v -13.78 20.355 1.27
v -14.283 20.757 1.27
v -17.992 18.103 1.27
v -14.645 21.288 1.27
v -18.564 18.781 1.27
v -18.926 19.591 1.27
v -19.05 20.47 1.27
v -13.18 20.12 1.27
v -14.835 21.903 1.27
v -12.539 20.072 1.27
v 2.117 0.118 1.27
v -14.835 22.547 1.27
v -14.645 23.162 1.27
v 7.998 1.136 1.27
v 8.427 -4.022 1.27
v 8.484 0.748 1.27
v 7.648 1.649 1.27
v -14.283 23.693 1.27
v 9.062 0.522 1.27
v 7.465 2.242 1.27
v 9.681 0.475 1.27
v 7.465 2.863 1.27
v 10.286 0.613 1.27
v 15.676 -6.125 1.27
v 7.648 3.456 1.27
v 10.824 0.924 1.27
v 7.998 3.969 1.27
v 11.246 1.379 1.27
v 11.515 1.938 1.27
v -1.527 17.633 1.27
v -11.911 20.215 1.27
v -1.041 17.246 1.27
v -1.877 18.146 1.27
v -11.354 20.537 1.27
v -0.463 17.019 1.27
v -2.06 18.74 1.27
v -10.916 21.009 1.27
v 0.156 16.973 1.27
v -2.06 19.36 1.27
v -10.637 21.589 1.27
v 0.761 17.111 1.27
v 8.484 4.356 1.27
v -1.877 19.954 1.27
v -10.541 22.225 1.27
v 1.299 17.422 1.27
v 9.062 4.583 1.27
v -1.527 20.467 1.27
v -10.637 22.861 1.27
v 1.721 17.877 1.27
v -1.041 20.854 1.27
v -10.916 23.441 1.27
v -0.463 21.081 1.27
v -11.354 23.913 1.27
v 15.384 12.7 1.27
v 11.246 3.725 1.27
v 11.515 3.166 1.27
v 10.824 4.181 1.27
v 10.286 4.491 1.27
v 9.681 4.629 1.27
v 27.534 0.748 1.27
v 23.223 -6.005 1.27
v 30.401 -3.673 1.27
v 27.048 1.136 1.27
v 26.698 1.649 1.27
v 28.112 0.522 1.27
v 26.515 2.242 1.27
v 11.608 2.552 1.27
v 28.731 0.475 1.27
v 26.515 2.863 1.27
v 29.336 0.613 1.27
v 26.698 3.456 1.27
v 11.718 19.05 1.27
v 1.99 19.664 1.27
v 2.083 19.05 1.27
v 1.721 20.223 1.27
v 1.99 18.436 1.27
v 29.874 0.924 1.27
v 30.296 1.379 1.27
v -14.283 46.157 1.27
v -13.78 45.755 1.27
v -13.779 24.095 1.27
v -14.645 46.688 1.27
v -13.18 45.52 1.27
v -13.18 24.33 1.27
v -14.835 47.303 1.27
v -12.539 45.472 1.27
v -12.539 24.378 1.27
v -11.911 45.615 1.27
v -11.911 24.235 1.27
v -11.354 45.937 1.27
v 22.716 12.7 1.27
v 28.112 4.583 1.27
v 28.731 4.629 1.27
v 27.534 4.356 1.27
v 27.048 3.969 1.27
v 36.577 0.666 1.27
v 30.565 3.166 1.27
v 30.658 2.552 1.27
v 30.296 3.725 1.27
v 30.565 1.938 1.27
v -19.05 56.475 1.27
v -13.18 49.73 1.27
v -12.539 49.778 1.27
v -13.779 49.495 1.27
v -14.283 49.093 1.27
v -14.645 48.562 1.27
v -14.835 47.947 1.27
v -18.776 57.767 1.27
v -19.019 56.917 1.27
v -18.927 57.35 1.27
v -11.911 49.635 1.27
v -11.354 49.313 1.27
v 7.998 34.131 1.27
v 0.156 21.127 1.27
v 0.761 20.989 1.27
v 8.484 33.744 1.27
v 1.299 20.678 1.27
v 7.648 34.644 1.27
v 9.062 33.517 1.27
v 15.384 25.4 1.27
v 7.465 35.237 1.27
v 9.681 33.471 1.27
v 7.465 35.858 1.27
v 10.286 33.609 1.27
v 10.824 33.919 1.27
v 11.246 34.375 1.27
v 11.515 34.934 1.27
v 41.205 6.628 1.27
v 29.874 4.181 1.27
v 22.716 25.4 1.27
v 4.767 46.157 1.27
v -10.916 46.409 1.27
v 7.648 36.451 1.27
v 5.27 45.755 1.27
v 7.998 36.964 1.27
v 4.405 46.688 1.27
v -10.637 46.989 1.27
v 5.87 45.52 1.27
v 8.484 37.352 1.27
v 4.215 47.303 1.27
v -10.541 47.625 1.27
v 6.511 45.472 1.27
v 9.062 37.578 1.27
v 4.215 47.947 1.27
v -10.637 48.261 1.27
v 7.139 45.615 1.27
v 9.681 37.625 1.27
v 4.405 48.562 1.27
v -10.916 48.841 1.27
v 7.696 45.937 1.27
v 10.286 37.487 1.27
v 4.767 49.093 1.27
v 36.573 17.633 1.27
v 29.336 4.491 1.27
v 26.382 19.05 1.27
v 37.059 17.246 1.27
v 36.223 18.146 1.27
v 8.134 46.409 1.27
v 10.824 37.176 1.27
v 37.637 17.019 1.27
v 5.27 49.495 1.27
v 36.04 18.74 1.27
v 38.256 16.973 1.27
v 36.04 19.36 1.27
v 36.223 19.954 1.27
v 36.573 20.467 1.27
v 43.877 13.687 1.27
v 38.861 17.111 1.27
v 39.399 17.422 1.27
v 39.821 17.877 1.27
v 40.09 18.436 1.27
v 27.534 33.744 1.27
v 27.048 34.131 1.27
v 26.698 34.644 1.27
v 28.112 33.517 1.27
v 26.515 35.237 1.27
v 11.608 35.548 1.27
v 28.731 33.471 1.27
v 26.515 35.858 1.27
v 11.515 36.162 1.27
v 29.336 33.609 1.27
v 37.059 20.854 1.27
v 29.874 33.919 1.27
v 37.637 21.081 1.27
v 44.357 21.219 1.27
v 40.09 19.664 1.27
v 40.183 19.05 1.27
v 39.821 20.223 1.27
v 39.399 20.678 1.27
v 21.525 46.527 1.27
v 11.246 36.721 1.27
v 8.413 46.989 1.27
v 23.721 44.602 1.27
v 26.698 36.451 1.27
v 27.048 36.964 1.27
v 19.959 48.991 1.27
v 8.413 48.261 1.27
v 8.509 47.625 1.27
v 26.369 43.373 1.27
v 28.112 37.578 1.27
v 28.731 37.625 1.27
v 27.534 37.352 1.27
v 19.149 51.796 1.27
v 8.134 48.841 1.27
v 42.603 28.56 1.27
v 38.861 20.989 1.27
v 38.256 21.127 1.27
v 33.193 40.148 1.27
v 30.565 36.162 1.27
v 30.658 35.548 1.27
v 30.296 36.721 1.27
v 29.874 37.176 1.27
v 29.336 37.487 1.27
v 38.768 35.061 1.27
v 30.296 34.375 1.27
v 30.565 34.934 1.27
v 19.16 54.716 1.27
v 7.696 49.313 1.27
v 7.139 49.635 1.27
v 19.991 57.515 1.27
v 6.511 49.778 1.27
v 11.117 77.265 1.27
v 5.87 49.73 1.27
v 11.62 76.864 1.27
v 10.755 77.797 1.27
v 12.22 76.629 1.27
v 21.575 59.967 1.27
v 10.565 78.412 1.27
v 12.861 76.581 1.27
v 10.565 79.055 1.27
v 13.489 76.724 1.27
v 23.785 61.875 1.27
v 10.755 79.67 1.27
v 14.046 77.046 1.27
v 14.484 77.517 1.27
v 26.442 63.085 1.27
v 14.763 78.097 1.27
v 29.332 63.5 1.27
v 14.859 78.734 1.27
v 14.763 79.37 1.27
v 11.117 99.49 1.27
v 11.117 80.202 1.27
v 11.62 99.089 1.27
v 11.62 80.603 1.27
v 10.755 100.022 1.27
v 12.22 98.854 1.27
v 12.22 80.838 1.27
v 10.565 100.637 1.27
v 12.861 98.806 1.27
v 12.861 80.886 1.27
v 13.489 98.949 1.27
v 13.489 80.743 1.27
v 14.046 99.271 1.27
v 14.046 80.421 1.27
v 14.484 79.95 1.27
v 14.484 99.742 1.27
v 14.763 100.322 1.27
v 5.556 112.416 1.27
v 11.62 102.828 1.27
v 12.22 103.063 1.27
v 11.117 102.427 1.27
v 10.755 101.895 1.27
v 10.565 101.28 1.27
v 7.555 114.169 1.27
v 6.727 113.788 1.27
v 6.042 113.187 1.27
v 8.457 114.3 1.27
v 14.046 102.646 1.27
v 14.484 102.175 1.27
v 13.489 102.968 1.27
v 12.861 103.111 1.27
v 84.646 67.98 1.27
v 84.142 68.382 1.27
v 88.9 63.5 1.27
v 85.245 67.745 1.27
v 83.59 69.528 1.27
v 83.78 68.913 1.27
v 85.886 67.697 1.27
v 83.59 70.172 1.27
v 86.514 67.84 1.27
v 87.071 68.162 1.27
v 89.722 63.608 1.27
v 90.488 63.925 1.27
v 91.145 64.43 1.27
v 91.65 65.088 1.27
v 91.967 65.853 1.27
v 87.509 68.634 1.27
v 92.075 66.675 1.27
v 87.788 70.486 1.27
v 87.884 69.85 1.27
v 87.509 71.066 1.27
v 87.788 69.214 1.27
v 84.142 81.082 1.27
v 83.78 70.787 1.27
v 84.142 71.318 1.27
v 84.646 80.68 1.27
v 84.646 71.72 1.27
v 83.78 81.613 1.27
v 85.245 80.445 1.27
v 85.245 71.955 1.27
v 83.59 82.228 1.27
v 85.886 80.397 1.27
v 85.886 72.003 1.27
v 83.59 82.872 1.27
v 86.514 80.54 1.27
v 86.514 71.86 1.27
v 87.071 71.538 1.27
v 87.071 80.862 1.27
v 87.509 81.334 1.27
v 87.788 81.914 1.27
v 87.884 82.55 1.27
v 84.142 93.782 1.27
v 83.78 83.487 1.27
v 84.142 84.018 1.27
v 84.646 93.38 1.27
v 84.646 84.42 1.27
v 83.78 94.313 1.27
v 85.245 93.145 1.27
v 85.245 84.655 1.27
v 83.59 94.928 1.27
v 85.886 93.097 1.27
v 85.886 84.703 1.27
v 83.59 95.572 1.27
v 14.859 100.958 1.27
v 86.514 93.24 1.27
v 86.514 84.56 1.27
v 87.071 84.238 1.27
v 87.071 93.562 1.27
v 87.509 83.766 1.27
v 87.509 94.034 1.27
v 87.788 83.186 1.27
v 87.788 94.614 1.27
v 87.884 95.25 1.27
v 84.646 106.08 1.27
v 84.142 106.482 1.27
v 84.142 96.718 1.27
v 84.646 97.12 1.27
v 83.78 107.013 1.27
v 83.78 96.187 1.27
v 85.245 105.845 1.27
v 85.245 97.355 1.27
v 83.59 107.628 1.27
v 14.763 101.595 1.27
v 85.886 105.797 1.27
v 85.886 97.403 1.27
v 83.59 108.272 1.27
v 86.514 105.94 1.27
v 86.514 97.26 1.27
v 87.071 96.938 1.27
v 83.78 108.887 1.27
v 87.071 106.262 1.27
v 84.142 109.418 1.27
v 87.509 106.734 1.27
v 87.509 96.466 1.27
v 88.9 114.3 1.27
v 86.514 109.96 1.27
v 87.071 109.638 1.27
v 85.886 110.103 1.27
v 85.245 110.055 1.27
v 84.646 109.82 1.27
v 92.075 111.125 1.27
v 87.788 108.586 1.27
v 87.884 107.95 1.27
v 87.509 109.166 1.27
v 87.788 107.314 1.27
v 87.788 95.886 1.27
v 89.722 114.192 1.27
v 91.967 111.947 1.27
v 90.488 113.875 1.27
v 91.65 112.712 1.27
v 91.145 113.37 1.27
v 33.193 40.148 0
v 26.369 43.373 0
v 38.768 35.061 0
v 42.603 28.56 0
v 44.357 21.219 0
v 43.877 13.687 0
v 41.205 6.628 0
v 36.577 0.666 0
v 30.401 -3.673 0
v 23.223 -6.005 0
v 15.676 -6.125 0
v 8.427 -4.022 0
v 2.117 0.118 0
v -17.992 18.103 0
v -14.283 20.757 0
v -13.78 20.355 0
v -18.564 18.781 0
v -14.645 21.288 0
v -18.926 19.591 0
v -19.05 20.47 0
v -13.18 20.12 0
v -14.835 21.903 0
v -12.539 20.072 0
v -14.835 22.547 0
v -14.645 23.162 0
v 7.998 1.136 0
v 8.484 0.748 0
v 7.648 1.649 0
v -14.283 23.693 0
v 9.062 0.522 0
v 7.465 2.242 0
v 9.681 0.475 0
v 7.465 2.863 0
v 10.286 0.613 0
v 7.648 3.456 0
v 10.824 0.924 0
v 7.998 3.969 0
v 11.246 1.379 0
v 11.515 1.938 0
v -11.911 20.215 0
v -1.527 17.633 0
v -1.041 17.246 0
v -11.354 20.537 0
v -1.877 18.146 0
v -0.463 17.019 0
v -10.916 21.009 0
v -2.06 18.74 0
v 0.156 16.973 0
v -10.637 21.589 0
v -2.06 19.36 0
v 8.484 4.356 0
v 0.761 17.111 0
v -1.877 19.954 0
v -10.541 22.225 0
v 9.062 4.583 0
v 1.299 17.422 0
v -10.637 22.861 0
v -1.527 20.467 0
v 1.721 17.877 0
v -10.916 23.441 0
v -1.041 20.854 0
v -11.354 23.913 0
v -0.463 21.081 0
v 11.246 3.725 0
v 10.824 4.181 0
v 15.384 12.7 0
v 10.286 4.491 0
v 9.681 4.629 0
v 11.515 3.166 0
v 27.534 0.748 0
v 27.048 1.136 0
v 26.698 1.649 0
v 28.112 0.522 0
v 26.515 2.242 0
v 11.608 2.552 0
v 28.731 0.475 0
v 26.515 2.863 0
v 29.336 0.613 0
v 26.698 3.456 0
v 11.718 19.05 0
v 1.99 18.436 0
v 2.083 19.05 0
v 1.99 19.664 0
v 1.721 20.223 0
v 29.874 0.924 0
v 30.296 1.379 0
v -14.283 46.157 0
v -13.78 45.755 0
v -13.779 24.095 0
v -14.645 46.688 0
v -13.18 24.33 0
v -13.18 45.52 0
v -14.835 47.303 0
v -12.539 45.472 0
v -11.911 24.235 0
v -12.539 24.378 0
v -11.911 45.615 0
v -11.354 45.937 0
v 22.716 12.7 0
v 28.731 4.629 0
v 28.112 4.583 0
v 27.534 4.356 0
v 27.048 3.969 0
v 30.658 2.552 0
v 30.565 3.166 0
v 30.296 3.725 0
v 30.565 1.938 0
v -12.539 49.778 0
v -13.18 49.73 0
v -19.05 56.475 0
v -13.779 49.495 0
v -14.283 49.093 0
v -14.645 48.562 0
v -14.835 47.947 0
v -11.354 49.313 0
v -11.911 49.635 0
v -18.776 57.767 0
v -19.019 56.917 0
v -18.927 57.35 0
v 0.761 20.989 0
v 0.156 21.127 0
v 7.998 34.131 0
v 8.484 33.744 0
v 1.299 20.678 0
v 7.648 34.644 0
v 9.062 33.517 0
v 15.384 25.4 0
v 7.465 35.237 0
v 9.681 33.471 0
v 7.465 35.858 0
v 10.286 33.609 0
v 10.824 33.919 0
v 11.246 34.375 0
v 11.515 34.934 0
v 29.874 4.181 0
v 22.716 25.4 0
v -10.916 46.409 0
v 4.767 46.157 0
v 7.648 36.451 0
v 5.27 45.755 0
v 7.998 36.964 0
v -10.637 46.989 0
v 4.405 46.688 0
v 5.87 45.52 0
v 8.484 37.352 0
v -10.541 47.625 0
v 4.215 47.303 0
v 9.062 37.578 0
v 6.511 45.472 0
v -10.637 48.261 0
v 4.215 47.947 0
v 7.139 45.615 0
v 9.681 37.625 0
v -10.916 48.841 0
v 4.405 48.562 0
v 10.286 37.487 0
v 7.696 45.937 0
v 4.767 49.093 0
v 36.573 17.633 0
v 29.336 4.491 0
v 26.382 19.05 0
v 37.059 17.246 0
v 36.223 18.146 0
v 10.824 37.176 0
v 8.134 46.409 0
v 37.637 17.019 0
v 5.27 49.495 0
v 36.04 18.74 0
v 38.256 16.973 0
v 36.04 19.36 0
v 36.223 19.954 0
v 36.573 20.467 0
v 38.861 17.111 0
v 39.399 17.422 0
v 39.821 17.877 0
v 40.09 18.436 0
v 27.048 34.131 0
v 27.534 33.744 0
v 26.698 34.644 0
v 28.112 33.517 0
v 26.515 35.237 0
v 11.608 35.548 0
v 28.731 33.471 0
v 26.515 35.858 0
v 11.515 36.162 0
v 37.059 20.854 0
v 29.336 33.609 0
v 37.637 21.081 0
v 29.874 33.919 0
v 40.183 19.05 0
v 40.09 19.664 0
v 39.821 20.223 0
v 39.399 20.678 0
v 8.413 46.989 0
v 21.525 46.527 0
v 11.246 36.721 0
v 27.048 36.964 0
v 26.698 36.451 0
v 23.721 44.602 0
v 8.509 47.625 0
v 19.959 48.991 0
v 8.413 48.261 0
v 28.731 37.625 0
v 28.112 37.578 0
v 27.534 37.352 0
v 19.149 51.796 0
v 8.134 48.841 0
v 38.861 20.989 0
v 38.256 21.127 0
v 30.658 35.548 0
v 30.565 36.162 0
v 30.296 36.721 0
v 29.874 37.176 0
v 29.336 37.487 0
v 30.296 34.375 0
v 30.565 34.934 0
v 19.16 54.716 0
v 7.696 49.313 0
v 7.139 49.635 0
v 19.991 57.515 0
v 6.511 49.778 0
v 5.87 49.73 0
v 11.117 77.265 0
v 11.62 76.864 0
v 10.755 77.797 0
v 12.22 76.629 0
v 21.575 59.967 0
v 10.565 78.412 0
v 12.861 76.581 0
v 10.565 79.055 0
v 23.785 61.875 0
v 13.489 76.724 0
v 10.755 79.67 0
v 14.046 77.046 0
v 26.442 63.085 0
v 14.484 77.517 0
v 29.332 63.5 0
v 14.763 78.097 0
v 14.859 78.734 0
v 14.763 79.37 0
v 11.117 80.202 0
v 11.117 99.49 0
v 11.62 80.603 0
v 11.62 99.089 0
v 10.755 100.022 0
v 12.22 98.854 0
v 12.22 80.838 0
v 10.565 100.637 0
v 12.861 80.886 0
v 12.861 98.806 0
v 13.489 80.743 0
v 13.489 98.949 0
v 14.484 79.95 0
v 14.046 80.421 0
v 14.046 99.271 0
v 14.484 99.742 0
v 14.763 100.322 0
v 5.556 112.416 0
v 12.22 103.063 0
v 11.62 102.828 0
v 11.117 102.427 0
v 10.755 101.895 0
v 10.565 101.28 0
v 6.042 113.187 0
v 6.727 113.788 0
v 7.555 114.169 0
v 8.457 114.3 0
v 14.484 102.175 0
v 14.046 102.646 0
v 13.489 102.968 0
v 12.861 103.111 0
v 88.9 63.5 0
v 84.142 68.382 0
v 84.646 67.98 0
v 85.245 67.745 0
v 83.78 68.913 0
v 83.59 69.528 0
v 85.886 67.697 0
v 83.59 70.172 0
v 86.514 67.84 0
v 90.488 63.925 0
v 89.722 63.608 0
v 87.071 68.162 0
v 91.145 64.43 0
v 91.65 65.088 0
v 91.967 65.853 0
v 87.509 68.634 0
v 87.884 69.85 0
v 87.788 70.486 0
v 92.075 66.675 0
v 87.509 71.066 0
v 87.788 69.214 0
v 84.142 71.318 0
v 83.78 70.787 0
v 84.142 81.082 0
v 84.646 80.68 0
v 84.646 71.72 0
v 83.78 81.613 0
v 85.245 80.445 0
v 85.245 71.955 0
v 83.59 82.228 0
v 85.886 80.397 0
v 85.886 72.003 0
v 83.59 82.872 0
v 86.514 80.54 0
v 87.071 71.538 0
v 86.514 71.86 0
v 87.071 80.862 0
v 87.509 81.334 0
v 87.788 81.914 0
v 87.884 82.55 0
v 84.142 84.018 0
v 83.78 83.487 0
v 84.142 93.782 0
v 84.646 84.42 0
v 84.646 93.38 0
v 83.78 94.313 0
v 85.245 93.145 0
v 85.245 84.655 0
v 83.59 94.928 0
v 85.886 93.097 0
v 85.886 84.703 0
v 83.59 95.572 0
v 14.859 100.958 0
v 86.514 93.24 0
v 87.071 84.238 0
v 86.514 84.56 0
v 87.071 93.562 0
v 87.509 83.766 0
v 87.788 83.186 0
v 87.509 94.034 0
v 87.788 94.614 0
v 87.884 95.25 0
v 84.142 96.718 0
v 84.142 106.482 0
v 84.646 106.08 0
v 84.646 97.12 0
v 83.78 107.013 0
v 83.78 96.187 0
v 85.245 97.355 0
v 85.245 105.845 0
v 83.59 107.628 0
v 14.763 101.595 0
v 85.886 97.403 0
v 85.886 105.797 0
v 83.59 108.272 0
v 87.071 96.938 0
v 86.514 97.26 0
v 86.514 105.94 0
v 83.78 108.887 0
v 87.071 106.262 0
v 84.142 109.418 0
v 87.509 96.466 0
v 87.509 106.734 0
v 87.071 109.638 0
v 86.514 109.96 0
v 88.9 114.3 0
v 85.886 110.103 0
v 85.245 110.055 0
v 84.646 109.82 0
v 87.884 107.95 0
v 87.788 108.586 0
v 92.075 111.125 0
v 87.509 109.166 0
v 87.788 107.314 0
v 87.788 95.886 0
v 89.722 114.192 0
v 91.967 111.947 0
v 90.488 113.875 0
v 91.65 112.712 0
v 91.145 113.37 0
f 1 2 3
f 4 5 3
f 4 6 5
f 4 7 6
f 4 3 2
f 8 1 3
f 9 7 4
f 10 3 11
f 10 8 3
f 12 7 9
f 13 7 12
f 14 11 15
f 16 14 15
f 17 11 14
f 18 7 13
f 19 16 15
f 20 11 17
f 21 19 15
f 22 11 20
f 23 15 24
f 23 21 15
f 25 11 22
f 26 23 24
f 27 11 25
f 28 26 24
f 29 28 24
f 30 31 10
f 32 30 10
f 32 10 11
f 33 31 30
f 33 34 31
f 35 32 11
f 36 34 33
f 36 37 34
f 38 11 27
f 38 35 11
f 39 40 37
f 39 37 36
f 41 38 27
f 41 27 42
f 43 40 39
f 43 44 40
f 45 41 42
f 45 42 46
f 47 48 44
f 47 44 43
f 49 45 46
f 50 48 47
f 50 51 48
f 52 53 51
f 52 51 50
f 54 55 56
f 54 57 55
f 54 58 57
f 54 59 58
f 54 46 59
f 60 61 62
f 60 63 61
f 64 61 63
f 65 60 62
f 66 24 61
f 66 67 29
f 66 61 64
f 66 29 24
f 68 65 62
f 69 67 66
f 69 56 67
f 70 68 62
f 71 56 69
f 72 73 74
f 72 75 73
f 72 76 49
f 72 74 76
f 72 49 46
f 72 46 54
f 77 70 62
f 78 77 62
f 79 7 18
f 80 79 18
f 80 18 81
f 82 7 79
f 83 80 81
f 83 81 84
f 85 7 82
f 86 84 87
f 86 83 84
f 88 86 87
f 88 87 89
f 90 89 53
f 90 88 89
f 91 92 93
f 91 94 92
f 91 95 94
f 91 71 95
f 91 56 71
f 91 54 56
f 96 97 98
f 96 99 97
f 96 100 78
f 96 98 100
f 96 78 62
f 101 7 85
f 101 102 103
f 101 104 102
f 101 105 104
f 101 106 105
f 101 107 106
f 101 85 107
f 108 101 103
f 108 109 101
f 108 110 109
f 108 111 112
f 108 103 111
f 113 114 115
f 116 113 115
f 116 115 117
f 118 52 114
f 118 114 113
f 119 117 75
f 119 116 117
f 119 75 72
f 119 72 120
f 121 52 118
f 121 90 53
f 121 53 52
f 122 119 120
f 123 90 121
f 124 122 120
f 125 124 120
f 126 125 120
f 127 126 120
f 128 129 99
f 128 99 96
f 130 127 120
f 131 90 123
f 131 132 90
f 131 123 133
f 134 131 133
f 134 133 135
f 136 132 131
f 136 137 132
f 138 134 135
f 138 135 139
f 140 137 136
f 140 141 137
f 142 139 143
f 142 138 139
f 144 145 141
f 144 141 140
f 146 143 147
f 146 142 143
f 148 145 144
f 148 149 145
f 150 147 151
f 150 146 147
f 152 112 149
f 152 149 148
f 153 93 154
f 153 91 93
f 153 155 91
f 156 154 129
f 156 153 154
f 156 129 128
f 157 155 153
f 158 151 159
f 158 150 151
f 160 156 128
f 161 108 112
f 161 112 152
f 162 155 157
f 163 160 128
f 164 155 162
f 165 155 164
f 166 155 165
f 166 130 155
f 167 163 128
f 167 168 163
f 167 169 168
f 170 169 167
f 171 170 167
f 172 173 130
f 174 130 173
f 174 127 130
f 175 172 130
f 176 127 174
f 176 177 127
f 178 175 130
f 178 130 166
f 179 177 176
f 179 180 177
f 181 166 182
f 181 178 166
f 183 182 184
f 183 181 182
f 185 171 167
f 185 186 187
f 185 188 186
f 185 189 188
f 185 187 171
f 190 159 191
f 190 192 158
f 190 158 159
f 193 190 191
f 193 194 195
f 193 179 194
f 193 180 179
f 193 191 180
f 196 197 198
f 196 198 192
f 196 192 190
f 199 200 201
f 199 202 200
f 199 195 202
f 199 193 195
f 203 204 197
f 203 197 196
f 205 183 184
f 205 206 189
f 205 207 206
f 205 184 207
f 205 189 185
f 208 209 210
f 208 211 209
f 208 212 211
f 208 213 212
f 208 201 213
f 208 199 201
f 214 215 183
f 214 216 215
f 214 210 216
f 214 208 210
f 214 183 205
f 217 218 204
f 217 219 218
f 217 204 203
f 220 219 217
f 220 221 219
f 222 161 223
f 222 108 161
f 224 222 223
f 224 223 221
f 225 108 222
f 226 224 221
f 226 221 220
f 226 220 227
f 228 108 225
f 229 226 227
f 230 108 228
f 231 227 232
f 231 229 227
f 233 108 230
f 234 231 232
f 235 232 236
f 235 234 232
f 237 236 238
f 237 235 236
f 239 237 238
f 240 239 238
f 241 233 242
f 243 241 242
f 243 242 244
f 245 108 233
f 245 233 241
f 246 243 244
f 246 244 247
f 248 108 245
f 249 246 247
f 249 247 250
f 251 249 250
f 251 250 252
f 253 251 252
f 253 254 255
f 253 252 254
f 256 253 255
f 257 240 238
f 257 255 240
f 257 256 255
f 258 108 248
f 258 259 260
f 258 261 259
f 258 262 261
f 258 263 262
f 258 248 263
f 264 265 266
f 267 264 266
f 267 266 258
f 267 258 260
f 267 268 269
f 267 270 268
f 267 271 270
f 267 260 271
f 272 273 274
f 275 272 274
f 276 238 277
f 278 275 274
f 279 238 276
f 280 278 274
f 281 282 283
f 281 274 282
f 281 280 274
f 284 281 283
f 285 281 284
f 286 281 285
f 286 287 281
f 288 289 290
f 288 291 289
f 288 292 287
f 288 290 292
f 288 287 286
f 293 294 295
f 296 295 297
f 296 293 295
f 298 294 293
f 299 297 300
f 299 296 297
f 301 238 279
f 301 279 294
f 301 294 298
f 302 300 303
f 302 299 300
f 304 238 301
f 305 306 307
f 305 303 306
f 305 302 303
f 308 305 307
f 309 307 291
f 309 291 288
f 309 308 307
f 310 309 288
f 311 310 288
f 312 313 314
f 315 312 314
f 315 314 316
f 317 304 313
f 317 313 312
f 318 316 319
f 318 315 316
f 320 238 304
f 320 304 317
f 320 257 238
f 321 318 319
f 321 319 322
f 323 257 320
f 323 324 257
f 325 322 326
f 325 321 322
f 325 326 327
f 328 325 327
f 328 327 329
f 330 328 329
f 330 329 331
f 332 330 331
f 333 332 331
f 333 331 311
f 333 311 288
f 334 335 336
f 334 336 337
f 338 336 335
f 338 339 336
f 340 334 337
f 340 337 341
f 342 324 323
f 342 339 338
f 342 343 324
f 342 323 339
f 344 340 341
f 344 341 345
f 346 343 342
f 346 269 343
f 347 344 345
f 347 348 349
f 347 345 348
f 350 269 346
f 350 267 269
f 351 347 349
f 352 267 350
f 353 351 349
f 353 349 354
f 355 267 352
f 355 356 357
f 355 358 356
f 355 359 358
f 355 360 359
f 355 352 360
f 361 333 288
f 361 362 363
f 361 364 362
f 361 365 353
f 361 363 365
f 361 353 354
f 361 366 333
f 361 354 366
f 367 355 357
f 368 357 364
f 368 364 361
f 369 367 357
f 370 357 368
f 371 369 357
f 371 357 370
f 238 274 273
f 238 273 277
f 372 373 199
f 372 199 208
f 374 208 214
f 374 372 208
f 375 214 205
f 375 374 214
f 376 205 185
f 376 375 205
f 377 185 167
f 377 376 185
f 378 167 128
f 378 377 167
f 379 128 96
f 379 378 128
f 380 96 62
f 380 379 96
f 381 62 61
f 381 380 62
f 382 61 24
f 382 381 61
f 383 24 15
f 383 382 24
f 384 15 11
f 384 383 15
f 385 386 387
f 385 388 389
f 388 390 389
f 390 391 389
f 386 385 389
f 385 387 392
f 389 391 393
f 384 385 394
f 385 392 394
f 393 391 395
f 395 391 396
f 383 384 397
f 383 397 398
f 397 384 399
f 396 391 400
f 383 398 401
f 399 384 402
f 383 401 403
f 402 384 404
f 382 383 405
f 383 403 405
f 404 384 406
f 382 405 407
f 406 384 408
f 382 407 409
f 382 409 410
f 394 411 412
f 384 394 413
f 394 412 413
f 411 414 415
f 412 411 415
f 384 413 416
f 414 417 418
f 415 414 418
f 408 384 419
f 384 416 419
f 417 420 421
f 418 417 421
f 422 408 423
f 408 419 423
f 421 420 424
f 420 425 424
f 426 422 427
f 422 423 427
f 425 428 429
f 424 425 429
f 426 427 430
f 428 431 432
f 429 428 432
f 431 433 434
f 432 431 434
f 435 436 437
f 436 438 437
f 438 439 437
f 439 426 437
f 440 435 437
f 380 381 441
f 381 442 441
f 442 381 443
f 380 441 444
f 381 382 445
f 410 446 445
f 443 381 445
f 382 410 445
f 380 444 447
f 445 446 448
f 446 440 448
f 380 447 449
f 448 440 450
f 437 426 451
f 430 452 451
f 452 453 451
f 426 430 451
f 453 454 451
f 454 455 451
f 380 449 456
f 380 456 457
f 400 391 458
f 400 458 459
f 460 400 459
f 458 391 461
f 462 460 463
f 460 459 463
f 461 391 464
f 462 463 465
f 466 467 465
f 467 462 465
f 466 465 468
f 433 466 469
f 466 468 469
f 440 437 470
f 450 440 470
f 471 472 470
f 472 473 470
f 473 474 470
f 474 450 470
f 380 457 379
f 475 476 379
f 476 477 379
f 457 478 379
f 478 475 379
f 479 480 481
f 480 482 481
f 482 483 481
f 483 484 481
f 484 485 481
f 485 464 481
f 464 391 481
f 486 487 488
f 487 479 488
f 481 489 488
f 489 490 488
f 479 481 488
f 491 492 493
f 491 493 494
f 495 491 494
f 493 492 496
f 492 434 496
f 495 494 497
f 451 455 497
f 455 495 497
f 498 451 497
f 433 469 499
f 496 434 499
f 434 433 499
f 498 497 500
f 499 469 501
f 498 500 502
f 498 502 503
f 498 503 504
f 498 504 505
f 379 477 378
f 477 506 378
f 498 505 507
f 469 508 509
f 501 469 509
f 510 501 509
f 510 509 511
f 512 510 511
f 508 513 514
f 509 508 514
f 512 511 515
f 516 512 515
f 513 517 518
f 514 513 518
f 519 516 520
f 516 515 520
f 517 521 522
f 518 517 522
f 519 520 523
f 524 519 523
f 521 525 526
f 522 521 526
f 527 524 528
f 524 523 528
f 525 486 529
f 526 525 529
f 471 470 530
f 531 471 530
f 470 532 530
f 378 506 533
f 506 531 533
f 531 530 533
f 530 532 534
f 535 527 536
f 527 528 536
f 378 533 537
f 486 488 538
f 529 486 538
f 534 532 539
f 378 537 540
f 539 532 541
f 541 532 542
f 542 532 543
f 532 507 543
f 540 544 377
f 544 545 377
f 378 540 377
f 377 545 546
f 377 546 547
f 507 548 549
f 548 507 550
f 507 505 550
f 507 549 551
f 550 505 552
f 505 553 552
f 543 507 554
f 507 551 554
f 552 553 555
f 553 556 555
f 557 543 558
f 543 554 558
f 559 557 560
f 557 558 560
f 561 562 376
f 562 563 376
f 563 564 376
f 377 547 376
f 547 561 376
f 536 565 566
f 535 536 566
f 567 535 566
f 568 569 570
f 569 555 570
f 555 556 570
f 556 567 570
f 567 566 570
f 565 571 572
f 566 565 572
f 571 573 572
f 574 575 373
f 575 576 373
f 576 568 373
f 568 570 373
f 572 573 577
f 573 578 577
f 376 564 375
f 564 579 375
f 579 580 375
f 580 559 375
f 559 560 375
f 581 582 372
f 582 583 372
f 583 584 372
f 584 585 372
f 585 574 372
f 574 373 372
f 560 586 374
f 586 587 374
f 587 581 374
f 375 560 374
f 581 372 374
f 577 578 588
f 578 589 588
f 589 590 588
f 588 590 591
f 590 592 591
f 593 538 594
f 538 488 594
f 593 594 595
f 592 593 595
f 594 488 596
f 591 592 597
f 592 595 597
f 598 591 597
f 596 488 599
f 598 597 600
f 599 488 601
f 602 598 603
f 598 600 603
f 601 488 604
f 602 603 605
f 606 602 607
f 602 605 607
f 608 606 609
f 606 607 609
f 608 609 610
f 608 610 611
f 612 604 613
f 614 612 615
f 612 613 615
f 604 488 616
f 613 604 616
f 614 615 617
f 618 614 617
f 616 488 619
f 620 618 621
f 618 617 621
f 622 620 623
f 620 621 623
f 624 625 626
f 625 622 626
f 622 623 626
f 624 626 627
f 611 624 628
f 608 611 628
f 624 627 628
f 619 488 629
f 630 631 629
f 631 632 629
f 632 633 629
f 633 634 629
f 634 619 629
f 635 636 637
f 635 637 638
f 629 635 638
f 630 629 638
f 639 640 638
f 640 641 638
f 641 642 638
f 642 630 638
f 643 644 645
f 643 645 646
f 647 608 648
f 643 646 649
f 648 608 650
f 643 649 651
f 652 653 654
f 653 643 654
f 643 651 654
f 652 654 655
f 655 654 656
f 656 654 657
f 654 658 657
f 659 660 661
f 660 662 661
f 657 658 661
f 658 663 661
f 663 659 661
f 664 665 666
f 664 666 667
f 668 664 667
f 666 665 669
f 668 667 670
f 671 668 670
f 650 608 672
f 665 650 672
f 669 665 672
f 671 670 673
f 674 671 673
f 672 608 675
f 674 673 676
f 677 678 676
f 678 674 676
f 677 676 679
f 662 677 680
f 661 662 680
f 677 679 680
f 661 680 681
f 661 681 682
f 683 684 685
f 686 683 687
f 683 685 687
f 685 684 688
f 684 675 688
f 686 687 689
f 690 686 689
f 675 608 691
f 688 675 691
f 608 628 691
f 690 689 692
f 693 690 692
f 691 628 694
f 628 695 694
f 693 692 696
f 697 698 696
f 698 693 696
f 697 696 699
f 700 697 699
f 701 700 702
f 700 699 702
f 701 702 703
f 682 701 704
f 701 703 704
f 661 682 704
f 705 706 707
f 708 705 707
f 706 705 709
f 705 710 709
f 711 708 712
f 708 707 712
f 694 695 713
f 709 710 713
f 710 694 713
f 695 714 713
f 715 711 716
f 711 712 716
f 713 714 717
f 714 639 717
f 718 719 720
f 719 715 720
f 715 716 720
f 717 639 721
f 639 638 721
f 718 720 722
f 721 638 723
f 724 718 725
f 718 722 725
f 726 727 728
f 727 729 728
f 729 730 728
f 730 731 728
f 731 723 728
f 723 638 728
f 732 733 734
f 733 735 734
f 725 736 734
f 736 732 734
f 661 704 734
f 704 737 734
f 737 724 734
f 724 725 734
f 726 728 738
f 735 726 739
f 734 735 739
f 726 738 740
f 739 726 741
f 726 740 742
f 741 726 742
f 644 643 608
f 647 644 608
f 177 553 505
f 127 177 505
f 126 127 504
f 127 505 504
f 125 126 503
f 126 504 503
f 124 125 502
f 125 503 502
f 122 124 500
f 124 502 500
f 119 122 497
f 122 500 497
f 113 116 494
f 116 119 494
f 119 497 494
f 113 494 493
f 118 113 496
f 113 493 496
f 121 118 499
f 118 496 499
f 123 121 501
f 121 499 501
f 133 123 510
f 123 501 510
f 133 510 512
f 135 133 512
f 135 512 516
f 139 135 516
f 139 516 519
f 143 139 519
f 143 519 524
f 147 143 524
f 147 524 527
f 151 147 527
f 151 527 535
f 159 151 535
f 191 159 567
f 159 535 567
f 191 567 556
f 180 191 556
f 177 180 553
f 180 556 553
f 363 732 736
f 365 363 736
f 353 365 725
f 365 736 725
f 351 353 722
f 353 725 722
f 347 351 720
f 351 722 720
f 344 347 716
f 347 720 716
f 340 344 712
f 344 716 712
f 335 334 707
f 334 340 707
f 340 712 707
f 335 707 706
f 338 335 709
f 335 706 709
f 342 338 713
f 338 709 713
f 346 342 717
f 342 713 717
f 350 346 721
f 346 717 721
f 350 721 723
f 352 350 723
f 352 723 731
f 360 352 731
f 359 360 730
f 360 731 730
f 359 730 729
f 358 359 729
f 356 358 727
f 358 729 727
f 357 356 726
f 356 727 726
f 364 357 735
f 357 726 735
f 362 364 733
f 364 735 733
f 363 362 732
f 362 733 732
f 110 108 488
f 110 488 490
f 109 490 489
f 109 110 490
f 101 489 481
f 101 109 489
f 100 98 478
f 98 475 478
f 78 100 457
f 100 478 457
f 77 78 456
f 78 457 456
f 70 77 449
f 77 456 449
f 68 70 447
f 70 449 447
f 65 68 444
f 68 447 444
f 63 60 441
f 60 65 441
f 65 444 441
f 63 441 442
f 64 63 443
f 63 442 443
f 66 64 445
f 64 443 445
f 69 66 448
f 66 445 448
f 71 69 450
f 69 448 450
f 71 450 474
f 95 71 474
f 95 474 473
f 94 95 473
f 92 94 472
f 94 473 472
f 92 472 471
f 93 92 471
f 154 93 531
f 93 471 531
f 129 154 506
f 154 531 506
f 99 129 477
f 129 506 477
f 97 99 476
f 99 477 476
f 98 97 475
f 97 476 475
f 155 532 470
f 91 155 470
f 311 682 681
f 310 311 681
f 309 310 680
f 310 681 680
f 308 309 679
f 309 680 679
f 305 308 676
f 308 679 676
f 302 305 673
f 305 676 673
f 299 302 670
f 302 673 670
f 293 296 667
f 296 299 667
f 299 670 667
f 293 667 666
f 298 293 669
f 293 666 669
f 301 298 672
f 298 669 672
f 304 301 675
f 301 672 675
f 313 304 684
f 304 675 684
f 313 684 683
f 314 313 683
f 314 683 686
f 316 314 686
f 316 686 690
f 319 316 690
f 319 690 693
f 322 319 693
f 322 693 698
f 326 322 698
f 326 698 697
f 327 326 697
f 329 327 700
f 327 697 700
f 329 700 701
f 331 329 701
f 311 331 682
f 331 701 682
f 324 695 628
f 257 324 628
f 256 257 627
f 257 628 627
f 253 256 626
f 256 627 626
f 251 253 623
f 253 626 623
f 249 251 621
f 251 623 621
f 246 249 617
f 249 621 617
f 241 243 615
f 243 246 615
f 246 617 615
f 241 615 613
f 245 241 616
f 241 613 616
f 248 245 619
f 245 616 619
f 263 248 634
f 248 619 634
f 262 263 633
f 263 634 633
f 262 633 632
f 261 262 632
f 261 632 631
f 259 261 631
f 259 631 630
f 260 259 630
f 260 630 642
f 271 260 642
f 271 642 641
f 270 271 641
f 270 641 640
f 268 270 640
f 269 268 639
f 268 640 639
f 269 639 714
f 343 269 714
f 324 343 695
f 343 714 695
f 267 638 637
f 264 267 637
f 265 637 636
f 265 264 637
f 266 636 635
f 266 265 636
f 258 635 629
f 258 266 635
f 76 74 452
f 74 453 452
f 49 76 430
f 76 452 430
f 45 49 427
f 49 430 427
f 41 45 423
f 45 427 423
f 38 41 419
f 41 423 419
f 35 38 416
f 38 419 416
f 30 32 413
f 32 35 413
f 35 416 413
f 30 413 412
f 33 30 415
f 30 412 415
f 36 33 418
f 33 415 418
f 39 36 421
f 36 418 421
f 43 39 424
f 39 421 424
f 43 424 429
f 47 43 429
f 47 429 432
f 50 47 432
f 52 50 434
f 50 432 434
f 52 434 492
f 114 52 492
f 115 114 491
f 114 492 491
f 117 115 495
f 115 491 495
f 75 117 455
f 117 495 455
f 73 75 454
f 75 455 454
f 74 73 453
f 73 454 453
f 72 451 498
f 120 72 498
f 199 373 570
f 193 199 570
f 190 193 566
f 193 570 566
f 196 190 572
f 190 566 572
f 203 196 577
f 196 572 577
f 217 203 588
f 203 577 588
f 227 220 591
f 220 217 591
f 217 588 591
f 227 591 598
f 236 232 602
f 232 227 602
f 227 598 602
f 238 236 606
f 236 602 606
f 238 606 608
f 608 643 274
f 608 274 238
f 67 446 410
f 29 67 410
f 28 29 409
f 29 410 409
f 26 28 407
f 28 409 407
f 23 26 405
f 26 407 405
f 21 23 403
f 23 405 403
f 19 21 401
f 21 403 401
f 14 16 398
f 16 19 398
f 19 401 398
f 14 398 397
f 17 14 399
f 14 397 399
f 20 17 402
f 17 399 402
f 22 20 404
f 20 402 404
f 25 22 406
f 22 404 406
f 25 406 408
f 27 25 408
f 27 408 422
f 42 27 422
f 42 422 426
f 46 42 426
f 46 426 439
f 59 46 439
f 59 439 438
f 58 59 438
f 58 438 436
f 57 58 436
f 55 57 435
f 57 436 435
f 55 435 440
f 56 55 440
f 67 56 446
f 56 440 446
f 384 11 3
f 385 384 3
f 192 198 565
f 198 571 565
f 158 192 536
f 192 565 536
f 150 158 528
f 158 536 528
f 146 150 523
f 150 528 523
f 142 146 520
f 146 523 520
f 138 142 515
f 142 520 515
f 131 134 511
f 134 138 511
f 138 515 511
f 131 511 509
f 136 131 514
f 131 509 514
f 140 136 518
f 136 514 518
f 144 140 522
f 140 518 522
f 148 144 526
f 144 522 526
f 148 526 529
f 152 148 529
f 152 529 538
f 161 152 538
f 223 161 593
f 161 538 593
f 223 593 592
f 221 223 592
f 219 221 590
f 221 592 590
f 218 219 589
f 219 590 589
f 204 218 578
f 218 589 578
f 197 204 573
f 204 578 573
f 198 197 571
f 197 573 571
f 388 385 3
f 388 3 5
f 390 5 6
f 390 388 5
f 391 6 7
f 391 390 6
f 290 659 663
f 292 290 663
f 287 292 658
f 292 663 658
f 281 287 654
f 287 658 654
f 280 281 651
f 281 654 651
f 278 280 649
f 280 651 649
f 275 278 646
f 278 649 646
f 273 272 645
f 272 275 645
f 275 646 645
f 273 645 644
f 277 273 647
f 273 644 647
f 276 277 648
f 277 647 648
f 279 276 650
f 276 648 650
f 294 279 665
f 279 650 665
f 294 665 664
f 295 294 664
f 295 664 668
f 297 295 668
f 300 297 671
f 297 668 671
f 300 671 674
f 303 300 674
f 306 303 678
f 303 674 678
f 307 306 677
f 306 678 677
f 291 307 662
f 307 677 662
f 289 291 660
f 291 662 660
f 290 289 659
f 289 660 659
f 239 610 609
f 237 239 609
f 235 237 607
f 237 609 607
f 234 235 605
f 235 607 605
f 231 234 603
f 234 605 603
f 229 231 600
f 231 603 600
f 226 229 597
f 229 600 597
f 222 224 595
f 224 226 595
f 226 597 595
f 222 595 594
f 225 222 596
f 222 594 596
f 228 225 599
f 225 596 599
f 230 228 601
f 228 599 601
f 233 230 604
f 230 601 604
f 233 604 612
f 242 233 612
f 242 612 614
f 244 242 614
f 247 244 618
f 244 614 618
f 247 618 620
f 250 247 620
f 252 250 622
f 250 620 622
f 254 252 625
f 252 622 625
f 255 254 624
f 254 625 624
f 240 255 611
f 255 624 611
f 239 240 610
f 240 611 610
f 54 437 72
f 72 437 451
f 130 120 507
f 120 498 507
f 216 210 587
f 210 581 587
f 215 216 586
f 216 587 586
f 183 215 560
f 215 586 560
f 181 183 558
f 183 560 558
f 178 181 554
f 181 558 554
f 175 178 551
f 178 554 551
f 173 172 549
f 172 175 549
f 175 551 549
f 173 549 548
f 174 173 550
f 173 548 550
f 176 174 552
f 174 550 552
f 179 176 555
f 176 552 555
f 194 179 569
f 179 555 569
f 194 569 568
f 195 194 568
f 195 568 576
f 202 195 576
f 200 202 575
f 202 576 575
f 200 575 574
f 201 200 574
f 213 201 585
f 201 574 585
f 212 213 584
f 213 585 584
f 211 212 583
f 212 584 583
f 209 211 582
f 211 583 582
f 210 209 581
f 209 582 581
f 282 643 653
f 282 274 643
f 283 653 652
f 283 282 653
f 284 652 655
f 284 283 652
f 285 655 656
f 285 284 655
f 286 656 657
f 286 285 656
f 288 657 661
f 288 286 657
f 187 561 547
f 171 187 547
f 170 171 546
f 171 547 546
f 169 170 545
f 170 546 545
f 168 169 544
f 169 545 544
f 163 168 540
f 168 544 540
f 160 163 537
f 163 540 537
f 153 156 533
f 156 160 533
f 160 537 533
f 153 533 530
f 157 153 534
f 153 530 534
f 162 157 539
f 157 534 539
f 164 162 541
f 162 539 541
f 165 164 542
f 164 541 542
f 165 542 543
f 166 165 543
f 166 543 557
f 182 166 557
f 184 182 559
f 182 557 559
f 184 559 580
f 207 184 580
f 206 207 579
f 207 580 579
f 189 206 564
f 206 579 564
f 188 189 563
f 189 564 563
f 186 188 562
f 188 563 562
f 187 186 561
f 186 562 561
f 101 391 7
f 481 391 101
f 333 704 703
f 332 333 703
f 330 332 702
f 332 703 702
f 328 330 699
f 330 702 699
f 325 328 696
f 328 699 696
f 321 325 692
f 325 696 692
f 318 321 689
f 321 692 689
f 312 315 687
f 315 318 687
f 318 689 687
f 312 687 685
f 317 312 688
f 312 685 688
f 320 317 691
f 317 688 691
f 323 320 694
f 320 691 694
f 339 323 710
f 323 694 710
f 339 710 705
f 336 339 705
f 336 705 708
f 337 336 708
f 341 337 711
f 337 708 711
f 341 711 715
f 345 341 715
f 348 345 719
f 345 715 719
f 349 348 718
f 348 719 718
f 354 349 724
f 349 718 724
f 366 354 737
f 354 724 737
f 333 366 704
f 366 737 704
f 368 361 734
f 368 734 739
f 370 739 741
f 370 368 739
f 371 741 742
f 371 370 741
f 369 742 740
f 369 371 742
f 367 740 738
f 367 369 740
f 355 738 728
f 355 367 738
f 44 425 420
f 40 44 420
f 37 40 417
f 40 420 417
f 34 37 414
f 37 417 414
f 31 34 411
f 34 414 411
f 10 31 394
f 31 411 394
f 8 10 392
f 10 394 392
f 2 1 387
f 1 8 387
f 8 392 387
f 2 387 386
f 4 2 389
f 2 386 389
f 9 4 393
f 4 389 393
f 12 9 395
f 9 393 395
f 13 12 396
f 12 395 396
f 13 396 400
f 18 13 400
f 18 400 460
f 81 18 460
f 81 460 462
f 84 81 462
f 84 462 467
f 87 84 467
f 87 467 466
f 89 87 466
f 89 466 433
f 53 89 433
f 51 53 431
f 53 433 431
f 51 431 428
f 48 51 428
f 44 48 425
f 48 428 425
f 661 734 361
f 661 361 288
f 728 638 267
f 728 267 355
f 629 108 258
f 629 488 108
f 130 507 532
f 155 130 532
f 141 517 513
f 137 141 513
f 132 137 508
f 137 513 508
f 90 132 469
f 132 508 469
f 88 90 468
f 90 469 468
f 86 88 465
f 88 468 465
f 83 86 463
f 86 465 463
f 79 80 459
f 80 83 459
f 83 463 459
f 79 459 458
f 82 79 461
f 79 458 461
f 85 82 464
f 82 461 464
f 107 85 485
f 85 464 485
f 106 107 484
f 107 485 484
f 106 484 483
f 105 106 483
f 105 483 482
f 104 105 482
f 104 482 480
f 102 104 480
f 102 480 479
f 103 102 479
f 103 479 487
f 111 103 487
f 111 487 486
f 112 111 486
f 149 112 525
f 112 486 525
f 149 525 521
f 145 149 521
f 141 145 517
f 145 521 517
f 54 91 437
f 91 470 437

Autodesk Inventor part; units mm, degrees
ref_plane "YZ Plane" through (0, 0, 0) normal (1, 0, 0) x (0, 1, 0)
ref_plane "XZ Plane" through (0, 0, 0) normal (0, 1, 0) x (-1, 0, 0)
ref_plane "XY Plane" through (0, 0, 0) normal (0, 0, 1) x (1, 0, 0)
sketch "Sketch1" plane through (0, 0, 0) normal (0, 0, 1) x (1, 0, 0)
  circle A0 centre (19.05, 19.05) radius 7.9375
  line L0 (22.7162, 25.4) -> (26.3823, 19.05)
  line L1 (26.3823, 19.05) -> (22.7162, 12.7)
  line L2 (22.7162, 12.7) -> (15.3838, 12.7)
  line L3 (15.3838, 12.7) -> (11.7177, 19.05)
  line L4 (11.7177, 19.05) -> (15.3838, 25.4)
  line L5 (15.3838, 25.4) -> (22.7162, 25.4)
  circle A1 centre (0, 19.05) radius 2.0828
  line L6 (0, 19.05) -> (19.05, 19.05) construction
  circle A2 centre (9.525, 2.5522) radius 2.0828
  circle A3 centre (28.575, 2.5522) radius 2.0828
  circle A4 centre (38.1, 19.05) radius 2.0828
  circle A5 centre (28.575, 35.5478) radius 2.0828
  circle A6 centre (9.525, 35.5478) radius 2.0828
  circle A7 centre (19.05, 19.05) radius 25.4
  line L7 (19.05, -6.35) -> (-19.05, -6.35)
  line L8 (-19.05, -6.35) -> (-19.05, 57.15)
  line L9 (6.3948, 114.3) -> (92.075, 114.3)
  line L10 (92.075, 114.3) -> (92.075, 63.5)
  line L11 (92.075, 63.5) -> (29.3317, 63.5)
  line L12 (-121.3454, 55.7276) -> (199.3502, 55.7276) construction
  arc A8 (29.3317, 63.5) -> (26.369, 43.3727) centre (29.3317, 53.2183) ccw
  circle A9 centre (85.725, 69.85) radius 2.159
  circle A10 centre (85.725, 82.55) radius 2.159
  circle A11 centre (85.725, 95.25) radius 2.159
  circle A12 centre (85.725, 107.95) radius 2.159
  line L13 (29.3317, 53.2183) -> (19.05, 53.2183) construction
  line L14 (-19.05, 57.15) -> (6.3948, 114.3)
  circle A13 centre (-12.7, 47.625) radius 2.159
  circle A14 centre (6.35, 47.625) radius 2.159
  circle A15 centre (-12.7, 22.225) radius 2.159
  circle A16 centre (12.7, 78.7335) radius 2.159
  circle A17 centre (12.7, 100.9585) radius 2.159
  point P0 (0, 0)
  point P1 (19.05, 44.45)
  dimension "d7" = 15.875
  dimension "d8" = 12.7
  dimension "d23" = 4.1656
  dimension "d25" = 19.05
  dimension "d26" = 0
  dimension "d29" = 360
  dimension "d41" = 50.8
  dimension "d42" = 19.05
  dimension "d43" = 19.05
  dimension "d44" = 38.1
  dimension "d55" = 73.025
  dimension "d57" = 4.318
  dimension "d58" = 6.35
  dimension "d59" = 6.35
  dimension "d62" = 12.7
  dimension "d67" = 6.35
  dimension "d68" = 36.6776
  dimension "d69" = 50.8
  dimension "d70" = 38.1
  dimension "d71" = 114
  dimension "d72" = 57.15
  dimension "d76" = 56.3933
  dimension "d78" = 6.35
  dimension "d79" = 9.525
  dimension "d84" = 19.05
  dimension "d91" = 31.75
  dimension "d98" = 25.4
  dimension "d105" = 22.225
  dimension "d113" = 6.35
extrude "Extrusion1" add sketch "Sketch1" along normal blind 1.27 contours A0 | A7 | A7 L7 L8 L14 L9 L10 L11 A8
sketch "Sketch2" plane through (0, 0, 1.27) normal (0, 0, 1) x (1, 0, 0)
  line L0 (-19.05, -6.35) -> (19.05, -6.35) projected
  arc A0 (19.05, -6.35) -> (26.369, 43.3727) centre (19.05, 19.05) ccw projected
  line L1 (-19.05, 57.15) -> (-19.05, -6.35) projected
  circle A1 centre (19.05, 19.05) radius 25.4
  line L2 (2.1167, 0.118) -> (-19.05, 19.05)
  line L3 (-19.05, 19.05) -> (-19.05, -6.35)
  line L4 (-19.05, -6.35) -> (19.05, -6.35)
  arc A2 (2.1167, 0.118) -> (19.05, -6.35) centre (19.05, 19.05) ccw
  point P0 (-19.05, 56.4751)
  point P1 (0, 0)
  dimension "d110" = 25.4
extrude "Extrusion2" cut sketch "Sketch2" against normal blind 25.4 contours L1 L2 A1 L0
fillet "Fillet2" radius 3.175 5 edges at (6.3948, 114.3, 0.635) (-19.05, 57.15, 0.635) (-19.05, 19.05, 0.635) (92.075, 63.5, 0.635) (92.075, 114.3, 0.635)
equation "\"d67\" = d58"
properties part number "Sprng Steel Arm Mount" material "Steel AISI 1080"
